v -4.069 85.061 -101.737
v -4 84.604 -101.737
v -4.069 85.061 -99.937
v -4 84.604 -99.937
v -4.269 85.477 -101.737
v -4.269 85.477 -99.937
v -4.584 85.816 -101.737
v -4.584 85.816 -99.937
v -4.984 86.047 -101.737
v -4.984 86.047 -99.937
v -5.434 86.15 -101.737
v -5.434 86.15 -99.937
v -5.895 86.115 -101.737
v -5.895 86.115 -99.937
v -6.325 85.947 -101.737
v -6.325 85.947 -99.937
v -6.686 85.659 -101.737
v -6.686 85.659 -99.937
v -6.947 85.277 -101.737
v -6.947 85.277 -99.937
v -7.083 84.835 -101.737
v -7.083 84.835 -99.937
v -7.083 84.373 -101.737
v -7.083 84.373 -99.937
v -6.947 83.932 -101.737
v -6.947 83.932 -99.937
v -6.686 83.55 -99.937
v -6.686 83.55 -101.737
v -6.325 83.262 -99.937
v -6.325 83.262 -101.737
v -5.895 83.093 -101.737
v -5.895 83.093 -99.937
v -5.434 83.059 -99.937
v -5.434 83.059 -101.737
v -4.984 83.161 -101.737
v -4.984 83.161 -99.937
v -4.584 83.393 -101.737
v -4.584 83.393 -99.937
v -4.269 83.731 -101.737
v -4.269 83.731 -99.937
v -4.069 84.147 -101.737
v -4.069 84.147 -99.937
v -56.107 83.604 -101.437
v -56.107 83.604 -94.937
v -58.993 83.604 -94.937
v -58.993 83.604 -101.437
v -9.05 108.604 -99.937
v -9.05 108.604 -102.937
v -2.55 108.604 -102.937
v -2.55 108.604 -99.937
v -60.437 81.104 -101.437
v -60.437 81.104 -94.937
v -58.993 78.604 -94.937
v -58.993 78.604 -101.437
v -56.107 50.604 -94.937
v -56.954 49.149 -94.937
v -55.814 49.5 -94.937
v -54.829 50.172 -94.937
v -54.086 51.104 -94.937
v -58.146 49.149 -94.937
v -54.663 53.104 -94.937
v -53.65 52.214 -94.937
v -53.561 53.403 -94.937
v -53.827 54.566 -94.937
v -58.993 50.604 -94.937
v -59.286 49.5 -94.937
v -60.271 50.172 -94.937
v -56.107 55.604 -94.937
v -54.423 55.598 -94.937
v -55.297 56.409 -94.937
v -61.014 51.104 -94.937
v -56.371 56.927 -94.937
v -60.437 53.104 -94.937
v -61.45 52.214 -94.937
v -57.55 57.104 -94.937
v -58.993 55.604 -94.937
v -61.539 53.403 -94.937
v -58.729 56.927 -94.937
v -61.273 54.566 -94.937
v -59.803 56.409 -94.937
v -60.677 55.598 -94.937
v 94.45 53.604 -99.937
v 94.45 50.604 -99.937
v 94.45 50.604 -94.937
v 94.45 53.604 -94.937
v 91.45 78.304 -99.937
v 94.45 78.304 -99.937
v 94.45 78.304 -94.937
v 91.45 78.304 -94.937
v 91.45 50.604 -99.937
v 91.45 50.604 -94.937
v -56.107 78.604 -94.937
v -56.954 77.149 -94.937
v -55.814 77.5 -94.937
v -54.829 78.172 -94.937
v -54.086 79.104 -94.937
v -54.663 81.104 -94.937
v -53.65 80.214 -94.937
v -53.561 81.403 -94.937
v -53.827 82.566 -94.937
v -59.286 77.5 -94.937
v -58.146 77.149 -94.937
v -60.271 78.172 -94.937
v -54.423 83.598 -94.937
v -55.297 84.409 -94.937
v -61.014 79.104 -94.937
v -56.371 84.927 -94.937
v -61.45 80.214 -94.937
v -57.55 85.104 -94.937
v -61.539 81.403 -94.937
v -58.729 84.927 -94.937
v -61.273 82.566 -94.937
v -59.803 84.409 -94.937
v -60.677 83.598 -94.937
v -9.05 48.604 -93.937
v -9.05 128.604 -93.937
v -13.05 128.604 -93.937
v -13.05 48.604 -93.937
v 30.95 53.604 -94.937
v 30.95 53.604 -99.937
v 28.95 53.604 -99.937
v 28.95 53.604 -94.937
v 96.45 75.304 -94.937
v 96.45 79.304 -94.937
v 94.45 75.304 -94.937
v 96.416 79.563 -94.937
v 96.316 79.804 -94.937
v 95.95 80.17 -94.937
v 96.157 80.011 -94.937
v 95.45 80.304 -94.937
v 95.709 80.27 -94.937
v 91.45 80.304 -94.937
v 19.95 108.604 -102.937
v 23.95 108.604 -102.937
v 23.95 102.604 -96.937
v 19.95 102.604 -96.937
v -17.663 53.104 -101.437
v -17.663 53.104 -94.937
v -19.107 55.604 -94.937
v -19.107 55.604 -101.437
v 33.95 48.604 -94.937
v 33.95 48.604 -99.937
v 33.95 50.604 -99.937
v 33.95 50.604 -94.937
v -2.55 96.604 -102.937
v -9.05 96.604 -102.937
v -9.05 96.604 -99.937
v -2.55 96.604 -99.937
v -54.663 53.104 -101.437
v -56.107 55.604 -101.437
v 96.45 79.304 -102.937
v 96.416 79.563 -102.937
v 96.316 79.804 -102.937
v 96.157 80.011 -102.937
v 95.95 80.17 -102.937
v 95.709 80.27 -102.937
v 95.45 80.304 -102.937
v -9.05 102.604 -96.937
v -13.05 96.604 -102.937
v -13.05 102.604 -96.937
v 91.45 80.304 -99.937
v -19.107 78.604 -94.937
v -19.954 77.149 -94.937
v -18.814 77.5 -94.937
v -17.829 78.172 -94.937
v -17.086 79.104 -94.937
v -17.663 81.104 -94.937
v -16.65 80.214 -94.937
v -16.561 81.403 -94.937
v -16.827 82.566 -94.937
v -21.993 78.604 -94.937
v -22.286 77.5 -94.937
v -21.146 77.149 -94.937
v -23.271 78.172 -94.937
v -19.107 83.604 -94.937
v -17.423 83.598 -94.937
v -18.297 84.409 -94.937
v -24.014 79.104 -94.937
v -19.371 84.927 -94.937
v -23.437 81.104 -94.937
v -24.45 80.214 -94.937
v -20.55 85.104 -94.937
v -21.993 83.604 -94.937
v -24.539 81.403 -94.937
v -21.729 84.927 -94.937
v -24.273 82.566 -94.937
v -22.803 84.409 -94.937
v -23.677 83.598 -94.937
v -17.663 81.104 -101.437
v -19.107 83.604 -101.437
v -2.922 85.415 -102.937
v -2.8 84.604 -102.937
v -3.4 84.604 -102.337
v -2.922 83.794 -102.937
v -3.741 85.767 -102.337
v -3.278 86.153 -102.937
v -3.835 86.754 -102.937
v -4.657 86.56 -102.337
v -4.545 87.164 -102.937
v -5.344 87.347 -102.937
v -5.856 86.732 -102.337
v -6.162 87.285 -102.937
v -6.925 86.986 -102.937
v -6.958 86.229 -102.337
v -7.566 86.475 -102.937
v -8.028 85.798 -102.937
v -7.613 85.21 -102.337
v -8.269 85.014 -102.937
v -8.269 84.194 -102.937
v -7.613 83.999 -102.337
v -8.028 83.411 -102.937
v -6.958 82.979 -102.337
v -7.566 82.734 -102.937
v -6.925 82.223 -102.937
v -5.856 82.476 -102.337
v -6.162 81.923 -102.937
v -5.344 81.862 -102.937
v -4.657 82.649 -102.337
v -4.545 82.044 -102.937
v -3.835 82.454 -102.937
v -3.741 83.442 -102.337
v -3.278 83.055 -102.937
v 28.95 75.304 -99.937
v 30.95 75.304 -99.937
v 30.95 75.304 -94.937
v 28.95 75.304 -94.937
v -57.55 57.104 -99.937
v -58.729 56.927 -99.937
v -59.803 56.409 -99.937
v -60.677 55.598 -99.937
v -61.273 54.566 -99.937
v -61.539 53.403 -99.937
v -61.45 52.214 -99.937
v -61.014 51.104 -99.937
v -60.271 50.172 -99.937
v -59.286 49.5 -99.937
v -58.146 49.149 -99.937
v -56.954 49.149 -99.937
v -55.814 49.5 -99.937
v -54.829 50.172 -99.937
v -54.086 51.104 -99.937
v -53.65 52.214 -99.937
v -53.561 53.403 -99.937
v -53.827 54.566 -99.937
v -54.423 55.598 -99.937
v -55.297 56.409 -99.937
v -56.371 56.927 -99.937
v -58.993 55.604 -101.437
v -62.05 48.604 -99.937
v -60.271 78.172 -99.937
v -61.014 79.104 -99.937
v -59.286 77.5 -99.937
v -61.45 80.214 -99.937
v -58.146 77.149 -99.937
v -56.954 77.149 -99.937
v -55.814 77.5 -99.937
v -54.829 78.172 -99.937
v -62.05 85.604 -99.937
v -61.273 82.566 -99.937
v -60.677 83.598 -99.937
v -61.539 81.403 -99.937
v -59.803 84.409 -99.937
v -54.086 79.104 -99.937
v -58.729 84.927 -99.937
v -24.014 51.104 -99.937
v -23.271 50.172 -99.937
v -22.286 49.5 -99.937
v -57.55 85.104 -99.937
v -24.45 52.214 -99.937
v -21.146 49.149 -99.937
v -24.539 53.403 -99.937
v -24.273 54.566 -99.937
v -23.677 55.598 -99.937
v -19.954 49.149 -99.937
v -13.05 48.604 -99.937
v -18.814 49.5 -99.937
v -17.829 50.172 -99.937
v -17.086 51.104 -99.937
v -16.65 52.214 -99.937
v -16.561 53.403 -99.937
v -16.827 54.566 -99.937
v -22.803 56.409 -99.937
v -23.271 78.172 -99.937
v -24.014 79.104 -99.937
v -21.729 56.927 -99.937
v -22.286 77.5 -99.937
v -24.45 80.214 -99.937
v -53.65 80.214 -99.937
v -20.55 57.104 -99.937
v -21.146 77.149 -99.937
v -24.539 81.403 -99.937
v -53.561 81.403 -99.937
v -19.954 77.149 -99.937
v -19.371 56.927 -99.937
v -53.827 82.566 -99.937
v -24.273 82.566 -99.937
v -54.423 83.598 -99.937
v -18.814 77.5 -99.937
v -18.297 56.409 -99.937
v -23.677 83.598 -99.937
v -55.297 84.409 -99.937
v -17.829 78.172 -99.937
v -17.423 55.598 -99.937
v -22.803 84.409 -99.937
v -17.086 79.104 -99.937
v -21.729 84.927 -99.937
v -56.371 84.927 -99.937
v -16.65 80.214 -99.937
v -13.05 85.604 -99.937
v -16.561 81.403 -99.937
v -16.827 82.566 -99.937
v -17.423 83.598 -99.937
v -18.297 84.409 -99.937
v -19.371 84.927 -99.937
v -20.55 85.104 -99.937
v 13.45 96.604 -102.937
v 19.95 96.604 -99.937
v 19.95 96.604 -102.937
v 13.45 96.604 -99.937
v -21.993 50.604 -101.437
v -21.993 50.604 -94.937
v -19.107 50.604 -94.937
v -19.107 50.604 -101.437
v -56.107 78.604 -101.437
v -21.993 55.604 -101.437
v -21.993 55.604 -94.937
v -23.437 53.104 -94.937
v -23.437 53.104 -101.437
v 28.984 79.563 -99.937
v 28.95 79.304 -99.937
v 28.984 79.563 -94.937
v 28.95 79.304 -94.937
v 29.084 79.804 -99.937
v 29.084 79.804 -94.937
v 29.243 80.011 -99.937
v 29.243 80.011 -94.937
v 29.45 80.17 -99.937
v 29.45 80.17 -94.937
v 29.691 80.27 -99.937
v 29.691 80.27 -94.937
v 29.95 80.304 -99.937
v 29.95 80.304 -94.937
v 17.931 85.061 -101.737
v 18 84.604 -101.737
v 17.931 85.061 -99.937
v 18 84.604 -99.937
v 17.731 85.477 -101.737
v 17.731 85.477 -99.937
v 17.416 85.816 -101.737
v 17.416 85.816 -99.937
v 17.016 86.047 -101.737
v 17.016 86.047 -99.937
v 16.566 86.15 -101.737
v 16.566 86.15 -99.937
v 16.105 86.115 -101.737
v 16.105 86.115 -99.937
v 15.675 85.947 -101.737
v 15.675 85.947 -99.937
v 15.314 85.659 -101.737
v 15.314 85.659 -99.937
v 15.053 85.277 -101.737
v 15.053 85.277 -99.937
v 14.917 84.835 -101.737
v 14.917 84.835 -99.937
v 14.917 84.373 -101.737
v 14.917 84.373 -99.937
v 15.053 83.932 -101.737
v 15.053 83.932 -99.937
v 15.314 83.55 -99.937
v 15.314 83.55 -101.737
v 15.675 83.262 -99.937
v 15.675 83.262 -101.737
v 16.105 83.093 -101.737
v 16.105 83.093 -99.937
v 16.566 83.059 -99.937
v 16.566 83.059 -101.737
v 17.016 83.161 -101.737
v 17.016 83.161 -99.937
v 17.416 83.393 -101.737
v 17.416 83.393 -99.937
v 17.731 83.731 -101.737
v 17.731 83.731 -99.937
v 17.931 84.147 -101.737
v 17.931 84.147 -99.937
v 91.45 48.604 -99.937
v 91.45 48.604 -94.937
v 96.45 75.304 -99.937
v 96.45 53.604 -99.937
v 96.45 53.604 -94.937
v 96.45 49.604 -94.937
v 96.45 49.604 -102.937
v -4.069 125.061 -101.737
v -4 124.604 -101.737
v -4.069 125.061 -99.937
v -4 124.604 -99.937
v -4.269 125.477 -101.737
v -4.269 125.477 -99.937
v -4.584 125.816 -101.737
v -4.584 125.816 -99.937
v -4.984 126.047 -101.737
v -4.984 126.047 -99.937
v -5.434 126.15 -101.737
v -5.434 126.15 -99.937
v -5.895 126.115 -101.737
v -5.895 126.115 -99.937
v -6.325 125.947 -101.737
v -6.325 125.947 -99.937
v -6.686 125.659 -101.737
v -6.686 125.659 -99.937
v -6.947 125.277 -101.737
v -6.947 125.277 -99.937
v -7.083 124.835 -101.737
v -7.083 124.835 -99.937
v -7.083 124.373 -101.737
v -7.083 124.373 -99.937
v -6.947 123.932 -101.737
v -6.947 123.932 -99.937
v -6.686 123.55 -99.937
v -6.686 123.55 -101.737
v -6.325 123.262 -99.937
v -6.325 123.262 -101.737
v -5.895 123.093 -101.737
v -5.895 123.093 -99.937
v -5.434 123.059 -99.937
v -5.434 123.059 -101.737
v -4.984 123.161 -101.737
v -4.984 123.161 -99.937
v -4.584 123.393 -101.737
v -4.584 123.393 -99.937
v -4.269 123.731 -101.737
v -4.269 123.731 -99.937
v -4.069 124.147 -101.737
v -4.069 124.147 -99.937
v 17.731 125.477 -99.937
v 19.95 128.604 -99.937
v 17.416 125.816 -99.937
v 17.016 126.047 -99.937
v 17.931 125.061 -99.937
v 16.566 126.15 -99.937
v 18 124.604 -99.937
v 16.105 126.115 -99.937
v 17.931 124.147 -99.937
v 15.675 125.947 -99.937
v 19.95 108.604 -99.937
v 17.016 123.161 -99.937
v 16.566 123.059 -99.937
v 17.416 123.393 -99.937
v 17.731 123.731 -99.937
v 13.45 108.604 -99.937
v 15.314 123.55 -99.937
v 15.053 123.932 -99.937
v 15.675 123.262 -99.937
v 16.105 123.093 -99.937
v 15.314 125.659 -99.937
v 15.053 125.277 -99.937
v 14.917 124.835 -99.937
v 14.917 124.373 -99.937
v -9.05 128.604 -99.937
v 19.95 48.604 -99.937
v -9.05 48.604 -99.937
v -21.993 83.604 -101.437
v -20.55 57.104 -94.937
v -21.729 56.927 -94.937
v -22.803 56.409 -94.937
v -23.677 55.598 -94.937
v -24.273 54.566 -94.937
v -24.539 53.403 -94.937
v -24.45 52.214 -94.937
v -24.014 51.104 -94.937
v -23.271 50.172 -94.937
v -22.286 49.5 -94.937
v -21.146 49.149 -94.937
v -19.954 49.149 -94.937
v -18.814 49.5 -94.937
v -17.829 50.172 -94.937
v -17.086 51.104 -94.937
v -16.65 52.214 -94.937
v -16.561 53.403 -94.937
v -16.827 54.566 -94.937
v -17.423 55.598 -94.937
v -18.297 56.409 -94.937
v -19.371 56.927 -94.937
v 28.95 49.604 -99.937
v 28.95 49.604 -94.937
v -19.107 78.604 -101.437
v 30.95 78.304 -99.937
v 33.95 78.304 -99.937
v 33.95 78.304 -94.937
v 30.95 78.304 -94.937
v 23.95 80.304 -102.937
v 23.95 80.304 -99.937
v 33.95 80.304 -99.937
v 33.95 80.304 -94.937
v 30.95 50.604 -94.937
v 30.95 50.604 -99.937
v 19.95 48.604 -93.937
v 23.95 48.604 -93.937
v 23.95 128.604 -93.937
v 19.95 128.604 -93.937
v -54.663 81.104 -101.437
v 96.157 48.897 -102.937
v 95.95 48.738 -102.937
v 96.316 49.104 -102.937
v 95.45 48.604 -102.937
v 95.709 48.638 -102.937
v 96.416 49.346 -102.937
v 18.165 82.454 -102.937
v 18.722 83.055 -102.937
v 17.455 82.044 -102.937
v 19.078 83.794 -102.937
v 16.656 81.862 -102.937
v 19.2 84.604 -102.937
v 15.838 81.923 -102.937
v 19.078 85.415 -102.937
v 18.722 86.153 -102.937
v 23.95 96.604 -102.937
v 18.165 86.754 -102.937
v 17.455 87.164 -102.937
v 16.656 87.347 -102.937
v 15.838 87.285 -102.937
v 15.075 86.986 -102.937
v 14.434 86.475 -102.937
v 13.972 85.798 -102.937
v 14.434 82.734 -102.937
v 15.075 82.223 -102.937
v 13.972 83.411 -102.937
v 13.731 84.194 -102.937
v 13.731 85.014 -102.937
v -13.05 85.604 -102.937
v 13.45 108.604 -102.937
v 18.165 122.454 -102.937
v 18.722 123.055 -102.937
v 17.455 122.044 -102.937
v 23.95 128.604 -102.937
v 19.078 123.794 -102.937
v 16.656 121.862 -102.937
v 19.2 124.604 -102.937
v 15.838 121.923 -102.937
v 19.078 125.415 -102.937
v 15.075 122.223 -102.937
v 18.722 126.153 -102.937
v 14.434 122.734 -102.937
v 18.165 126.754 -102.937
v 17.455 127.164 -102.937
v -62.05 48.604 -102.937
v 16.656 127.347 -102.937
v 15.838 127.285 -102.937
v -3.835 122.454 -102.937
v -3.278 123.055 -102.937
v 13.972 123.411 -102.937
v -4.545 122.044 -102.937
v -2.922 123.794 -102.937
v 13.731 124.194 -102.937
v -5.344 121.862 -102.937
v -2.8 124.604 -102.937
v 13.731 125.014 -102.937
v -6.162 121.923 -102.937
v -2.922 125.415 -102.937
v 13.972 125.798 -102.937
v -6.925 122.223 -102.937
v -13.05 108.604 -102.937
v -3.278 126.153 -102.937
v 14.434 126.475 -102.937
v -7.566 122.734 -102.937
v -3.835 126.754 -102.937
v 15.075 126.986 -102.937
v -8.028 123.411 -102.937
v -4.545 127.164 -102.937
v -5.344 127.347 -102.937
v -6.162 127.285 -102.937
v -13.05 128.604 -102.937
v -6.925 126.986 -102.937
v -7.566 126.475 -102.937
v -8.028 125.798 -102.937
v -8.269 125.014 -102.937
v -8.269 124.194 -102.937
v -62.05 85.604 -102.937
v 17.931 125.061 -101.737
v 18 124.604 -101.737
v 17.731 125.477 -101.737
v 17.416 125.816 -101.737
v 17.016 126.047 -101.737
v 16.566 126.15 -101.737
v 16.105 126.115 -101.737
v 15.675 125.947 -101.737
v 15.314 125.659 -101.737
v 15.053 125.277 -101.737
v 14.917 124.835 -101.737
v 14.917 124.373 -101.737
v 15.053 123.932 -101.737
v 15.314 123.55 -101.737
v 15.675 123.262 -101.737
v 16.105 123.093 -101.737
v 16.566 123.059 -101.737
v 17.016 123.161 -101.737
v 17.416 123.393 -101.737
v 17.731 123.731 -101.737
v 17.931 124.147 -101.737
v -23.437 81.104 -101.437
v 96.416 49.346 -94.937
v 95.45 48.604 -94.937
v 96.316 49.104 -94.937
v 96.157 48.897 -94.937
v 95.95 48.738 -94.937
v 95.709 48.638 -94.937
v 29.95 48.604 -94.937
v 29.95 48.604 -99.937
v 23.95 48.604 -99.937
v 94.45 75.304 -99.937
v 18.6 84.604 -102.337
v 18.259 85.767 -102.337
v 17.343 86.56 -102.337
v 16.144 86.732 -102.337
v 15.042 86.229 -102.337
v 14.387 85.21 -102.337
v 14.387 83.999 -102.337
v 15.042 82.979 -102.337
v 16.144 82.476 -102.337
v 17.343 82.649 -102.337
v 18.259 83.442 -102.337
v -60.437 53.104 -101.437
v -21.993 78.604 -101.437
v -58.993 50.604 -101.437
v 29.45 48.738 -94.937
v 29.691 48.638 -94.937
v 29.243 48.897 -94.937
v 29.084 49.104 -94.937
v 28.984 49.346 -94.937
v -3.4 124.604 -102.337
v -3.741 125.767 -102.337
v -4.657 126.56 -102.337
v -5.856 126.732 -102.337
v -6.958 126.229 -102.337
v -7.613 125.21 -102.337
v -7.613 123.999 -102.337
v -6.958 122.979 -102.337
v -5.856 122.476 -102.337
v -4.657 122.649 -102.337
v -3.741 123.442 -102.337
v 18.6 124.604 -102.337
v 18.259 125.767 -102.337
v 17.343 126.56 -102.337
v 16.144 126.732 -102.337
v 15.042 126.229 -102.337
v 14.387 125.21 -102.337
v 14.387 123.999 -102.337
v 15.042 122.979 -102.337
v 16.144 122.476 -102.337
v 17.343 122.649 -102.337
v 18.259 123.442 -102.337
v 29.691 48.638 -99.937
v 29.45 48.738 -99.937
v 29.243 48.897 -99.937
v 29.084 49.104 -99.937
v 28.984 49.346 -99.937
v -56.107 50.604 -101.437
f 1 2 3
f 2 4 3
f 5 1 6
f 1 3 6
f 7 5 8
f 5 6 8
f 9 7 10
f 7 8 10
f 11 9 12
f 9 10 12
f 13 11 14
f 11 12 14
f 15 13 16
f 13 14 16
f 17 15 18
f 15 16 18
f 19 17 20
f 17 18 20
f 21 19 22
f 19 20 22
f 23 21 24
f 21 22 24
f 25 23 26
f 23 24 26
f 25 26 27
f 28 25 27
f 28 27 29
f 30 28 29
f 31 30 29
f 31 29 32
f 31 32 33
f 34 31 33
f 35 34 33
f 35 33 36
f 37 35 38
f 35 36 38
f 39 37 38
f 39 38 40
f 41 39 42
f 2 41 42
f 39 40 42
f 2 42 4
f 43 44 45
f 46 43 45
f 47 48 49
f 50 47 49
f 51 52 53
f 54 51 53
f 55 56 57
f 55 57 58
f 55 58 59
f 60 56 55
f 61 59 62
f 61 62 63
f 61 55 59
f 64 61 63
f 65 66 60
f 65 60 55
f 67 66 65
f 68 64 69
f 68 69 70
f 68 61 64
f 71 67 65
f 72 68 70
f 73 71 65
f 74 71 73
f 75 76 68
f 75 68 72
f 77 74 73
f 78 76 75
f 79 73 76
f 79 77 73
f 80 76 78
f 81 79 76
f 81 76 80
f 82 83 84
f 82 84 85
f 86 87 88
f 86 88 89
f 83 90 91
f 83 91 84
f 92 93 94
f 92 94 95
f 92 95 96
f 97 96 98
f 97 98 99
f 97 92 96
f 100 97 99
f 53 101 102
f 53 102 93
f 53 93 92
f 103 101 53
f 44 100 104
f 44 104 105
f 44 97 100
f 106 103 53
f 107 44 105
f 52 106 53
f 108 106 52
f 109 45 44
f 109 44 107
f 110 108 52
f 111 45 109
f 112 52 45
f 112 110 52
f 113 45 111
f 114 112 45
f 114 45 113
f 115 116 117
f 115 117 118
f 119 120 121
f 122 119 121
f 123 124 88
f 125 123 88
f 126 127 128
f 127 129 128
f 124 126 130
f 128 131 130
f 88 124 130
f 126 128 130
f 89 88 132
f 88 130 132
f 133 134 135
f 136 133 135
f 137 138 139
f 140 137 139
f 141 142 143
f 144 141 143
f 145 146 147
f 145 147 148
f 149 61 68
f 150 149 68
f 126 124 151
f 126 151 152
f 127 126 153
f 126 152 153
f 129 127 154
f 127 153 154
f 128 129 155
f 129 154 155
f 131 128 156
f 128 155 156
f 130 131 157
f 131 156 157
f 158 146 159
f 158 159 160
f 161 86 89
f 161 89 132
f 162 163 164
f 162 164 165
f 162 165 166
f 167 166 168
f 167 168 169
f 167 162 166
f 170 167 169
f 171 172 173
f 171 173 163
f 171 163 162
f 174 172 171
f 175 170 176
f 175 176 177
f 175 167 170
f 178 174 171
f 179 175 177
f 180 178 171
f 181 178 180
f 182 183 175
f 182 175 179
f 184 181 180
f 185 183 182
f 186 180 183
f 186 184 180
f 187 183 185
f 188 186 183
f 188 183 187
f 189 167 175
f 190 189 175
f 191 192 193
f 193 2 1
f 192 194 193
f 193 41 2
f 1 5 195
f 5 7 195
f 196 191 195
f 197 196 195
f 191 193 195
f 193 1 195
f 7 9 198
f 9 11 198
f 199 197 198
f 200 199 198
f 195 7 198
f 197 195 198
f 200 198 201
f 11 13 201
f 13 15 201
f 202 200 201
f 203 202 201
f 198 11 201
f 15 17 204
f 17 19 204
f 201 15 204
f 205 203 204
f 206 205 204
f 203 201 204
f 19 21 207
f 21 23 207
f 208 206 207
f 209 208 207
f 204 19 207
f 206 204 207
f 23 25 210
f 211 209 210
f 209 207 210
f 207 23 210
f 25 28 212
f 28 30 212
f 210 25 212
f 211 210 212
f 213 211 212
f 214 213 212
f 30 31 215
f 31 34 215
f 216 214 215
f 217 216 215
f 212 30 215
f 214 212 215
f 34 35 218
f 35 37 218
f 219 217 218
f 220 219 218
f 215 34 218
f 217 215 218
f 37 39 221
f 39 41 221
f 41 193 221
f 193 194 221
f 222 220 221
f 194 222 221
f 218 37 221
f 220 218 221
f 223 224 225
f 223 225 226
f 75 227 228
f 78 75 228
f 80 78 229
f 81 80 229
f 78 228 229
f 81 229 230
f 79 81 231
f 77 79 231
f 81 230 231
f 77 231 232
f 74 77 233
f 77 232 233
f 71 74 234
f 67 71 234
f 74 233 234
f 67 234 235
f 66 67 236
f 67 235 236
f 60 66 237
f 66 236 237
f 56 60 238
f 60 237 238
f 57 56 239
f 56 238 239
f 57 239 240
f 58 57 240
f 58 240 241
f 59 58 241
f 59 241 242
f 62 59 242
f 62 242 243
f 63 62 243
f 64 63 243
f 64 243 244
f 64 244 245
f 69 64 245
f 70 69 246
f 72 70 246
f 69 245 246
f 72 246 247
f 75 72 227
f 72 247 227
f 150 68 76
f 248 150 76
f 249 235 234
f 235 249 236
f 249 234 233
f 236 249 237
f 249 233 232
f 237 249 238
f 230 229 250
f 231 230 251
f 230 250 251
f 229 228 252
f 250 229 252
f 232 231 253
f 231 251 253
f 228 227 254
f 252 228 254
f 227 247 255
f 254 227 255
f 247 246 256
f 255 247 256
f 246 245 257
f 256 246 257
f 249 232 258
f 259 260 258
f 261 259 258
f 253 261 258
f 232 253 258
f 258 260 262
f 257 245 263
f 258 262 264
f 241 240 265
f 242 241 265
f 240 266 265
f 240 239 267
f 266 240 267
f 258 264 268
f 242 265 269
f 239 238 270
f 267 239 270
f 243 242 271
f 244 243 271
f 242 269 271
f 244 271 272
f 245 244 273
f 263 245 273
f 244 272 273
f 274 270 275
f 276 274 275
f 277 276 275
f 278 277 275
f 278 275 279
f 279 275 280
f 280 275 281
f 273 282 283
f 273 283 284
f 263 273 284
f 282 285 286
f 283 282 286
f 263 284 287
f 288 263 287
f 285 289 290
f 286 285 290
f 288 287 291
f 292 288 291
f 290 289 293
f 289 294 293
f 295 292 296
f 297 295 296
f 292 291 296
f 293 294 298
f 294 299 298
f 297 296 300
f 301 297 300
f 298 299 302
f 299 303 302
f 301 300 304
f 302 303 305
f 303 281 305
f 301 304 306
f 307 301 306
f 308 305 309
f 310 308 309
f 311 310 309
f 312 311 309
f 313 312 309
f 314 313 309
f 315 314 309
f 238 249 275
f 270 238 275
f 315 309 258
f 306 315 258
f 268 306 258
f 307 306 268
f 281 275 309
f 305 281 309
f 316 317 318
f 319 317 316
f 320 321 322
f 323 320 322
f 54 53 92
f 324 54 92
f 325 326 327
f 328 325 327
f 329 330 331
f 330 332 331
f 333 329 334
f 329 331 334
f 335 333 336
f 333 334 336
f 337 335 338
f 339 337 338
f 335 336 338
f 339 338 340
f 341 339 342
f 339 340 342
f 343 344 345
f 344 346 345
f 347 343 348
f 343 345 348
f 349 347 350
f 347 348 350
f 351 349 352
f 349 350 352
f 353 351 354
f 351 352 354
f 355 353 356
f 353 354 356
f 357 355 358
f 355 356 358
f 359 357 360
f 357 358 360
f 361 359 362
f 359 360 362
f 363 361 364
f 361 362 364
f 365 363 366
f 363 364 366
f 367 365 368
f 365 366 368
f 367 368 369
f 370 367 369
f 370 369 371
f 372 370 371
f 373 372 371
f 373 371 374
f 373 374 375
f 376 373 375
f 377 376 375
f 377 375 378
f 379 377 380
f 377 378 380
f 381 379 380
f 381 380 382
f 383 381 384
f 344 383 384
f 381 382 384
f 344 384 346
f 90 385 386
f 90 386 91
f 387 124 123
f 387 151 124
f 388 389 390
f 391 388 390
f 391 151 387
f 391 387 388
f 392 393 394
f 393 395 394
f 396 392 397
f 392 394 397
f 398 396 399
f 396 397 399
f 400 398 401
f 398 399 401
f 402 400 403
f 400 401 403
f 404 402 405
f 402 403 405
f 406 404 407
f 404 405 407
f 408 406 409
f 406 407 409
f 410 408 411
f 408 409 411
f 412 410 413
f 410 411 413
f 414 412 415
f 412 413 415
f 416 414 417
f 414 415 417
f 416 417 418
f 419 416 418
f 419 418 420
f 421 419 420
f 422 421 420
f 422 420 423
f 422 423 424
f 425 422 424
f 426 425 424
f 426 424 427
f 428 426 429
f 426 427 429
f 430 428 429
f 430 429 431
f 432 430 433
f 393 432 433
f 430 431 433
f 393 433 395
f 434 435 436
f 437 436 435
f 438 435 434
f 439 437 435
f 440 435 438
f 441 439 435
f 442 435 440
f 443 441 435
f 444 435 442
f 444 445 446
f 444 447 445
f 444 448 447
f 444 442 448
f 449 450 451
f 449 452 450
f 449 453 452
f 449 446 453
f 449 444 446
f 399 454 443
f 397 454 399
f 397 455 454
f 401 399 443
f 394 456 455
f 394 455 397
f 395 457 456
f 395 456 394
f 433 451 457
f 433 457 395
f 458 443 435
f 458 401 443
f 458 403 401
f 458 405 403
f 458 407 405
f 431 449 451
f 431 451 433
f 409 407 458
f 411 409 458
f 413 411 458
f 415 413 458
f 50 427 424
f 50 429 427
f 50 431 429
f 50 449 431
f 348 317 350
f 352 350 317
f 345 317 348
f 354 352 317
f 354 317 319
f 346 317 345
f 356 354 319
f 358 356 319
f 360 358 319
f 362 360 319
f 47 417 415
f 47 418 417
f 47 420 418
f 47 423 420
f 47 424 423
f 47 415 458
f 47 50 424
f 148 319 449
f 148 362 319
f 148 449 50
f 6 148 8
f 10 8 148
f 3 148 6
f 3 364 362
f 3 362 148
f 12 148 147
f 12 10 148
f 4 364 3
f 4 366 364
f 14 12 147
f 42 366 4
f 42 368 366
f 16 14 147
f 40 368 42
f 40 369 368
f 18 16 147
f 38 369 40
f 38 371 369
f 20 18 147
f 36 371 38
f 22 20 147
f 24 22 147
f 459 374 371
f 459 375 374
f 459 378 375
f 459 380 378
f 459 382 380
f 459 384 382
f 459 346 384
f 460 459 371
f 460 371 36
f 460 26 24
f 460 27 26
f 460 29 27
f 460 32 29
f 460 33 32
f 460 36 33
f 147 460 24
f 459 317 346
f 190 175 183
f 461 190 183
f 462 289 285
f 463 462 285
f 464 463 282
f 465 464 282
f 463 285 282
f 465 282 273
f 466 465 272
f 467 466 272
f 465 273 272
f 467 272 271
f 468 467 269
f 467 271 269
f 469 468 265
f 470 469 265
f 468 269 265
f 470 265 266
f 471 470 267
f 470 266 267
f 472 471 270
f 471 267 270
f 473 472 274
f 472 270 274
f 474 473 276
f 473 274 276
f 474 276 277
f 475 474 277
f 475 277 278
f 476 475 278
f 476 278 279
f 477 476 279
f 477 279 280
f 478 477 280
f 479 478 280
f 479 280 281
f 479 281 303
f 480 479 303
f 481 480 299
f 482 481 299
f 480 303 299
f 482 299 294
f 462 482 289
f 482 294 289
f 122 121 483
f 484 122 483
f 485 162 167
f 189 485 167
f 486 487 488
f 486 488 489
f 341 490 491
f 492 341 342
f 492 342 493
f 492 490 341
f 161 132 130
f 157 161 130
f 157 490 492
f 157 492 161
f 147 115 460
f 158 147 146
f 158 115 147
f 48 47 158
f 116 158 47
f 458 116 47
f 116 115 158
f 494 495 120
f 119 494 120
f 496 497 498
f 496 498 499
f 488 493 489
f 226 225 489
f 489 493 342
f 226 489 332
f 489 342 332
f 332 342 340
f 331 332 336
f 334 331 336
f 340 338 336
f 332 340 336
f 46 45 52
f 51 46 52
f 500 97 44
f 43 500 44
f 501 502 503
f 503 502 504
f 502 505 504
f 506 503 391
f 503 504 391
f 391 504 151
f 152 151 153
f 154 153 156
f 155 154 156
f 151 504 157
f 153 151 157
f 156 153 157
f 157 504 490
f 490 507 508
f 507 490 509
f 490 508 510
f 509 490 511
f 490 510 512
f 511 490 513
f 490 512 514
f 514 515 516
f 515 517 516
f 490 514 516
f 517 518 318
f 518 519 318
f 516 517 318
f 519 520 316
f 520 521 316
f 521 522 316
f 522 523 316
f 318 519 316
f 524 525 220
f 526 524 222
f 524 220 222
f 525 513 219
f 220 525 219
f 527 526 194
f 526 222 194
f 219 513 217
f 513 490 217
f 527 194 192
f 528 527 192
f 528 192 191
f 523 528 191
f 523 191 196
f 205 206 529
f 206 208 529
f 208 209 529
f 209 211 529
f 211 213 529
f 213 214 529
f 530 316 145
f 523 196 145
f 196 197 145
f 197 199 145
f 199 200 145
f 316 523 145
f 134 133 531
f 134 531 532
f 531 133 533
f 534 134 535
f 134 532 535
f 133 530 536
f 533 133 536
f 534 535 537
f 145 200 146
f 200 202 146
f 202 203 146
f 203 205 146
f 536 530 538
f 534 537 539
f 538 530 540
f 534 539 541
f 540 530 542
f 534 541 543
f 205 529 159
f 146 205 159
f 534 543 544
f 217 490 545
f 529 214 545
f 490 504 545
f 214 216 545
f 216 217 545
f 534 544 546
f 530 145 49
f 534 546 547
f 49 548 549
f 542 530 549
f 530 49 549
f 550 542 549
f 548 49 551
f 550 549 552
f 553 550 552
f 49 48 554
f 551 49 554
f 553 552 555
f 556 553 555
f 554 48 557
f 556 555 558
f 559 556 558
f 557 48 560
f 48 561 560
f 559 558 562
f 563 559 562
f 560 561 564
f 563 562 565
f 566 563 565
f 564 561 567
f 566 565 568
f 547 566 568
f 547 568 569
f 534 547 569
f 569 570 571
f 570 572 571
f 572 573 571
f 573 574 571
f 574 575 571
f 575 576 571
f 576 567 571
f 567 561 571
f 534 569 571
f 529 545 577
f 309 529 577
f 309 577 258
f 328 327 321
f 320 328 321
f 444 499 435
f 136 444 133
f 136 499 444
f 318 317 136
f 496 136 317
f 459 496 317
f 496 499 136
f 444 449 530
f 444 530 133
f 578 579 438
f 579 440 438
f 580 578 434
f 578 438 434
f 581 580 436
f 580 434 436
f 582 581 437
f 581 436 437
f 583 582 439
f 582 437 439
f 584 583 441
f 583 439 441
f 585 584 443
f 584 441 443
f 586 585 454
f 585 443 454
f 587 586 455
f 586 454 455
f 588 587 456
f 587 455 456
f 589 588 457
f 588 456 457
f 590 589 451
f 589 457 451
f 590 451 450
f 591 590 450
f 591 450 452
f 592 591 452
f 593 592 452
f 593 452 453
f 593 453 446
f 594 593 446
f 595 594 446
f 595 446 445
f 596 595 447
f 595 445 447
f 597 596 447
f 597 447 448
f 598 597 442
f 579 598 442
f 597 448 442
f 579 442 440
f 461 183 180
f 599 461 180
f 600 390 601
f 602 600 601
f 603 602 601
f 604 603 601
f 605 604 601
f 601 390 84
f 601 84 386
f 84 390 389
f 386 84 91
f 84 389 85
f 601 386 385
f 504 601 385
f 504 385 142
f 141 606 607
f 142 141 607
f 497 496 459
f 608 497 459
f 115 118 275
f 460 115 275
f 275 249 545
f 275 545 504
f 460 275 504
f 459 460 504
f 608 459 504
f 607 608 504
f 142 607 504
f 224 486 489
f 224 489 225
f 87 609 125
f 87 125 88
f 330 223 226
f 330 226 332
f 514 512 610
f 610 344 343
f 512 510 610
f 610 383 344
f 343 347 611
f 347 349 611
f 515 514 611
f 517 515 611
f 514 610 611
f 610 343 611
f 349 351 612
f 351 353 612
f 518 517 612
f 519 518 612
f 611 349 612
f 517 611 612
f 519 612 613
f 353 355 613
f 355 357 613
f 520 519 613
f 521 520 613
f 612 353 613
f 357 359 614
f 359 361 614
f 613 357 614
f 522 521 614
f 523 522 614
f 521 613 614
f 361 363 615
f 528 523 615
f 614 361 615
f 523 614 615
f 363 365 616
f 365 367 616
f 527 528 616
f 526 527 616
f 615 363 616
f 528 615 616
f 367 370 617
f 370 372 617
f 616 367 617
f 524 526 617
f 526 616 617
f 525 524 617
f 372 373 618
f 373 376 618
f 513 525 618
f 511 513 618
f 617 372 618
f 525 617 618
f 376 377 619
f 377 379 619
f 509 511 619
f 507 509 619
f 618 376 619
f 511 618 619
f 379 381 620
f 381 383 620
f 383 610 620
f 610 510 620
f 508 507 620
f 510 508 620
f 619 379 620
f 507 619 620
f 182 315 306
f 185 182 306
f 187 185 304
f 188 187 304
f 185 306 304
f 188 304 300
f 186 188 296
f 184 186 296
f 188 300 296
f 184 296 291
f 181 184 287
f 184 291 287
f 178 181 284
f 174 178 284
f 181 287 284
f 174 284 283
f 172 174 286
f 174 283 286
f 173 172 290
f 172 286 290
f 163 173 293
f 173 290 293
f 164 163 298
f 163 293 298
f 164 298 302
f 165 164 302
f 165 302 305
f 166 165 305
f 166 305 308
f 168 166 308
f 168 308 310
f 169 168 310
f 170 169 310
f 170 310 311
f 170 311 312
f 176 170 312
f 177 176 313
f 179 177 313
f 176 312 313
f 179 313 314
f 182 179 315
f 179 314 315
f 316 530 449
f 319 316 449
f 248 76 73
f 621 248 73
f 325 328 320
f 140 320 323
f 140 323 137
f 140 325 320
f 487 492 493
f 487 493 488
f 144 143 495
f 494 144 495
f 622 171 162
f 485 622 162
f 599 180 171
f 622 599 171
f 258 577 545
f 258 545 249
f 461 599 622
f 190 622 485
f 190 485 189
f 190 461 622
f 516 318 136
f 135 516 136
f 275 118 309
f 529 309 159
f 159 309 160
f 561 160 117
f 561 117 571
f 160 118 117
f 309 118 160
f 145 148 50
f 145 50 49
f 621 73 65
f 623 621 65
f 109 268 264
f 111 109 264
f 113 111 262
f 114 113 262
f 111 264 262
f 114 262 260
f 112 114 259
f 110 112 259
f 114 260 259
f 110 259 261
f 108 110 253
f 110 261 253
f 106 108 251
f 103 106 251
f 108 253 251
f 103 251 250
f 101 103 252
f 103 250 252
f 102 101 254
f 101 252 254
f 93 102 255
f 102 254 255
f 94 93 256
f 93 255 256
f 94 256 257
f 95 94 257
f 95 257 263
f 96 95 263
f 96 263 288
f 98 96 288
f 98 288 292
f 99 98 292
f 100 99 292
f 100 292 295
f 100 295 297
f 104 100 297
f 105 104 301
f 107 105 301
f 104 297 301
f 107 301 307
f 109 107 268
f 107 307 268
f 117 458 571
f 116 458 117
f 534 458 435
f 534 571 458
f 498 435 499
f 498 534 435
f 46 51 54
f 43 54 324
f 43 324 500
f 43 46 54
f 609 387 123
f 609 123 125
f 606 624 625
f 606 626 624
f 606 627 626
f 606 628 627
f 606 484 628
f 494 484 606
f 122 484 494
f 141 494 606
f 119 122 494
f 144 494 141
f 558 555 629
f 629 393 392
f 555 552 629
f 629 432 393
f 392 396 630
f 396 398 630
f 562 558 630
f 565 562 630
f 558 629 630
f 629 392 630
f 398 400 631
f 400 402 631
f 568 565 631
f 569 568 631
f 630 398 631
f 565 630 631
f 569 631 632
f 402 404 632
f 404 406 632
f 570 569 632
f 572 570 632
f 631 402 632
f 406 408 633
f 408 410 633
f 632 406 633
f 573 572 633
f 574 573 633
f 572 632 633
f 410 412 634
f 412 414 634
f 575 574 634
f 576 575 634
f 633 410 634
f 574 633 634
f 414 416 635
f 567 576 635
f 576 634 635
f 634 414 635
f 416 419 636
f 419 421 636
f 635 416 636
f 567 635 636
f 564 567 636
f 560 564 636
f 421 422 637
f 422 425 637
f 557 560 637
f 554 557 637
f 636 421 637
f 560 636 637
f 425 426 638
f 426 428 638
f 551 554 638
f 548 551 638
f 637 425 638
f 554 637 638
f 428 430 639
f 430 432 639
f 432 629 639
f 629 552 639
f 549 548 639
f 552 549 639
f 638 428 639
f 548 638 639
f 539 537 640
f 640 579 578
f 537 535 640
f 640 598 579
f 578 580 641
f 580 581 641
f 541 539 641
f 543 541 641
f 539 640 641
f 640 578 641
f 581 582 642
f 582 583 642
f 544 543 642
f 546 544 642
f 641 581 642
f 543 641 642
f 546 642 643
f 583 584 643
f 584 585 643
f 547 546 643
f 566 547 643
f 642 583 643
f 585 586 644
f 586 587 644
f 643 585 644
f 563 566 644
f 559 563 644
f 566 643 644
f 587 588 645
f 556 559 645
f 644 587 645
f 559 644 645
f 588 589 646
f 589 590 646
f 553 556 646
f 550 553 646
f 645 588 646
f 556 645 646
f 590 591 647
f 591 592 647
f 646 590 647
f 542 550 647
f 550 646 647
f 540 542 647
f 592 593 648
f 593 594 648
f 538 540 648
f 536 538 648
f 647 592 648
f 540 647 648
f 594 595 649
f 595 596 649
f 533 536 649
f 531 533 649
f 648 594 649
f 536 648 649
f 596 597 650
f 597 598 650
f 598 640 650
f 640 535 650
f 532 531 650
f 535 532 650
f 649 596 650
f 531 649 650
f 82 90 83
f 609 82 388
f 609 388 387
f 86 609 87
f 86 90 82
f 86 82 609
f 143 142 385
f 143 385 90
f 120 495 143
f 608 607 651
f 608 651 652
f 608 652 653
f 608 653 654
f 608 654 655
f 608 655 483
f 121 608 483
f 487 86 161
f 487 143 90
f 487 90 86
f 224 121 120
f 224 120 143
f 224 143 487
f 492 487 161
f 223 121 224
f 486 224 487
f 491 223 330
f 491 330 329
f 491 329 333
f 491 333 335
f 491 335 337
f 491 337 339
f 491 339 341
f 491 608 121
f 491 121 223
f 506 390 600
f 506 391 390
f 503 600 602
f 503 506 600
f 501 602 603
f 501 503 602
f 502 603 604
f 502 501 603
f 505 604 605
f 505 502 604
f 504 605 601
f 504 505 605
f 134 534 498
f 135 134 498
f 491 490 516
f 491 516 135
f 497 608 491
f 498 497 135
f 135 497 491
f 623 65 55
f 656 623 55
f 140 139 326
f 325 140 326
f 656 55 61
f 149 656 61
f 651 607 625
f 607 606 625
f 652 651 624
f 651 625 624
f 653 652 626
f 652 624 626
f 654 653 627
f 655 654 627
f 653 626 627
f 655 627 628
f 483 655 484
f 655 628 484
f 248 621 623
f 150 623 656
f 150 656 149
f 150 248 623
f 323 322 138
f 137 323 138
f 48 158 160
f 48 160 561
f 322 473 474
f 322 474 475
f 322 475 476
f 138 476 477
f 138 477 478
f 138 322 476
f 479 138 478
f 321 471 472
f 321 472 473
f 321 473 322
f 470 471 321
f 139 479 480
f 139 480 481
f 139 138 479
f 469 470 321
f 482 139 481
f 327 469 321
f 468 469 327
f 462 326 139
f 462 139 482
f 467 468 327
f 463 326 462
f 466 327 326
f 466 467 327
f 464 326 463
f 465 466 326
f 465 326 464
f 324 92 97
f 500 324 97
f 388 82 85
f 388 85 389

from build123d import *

# Parameters (mm, degrees)
BOSS_EXTRUDE1_START                               = 19.95
BOSS_EXTRUDE1_DEPTH                               = 4
SKETCH2_W                                         = 33
SKETCH2_H                                         = 60
BOSS_EXTRUDE2_DEPTH                               = 3
CUT_EXTRUDE1_DEPTH                                = 4
SKETCH4_W                                         = 29
SKETCH4_H                                         = 3
CUT_EXTRUDE2_DEPTH                                = 12
SKETCH5_W                                         = 22.5
SKETCH5_H                                         = 3
BOSS_EXTRUDE3_DEPTH                               = 12
BOSS_EXTRUDE4_DEPTH                               = 20
SKETCH7_W                                         = 6.5
SKETCH7_H                                         = 3
CUT_EXTRUDE3_DEPTH                                = 12
BOSS_EXTRUDE5_DEPTH                               = 4
SKETCH9_W                                         = 3
SKETCH9_H                                         = 37
BOSS_EXTRUDE6_DEPTH                               = 49
SKETCH10_W                                        = 3
SKETCH10_H                                        = 31.7
BOSS_EXTRUDE7_DEPTH                               = 72.5
CSK_FOR_M2_5_FLAT_HEAD_MACHINE_SCREW1_D           = 3.1
CSK_FOR_M2_5_FLAT_HEAD_MACHINE_SCREW1_CSINK_D     = 5.5
CSK_FOR_M2_5_FLAT_HEAD_MACHINE_SCREW1_CSINK_ANGLE = 90
BOSS_EXTRUDE8_DEPTH                               = 5
FILLET1_R                                         = 1
SKETCH26_R                                        = 4
BOSS_EXTRUDE10_DEPTH                              = 5
CUT_EXTRUDE4_DEPTH                                = 6.5


with BuildPart() as part:
    # Boss-Extrude1: read off the stored shape, not the designer's step
    # Boss-Extrude1 outline → Boss-Extrude1 (new body)
    with BuildSketch(Plane.YZ.offset(BOSS_EXTRUDE1_START)):
        Polygon((108.604346835, -99.936709039), (108.604346835, -93.936709039), (48.604346835, -93.936709039), (48.604346835, -99.936709039), (99.604346835, -99.936709039), (102.604346835, -96.936709039), (105.604346835, -99.936709039), align=None)
    extrude(amount=BOSS_EXTRUDE1_DEPTH)

    # Sketch2 → Boss-Extrude2 (add)
    with BuildSketch(Plane(origin=(0, 0, -99.936709039), x_dir=(-1, 0, 0), z_dir=(0, 0, -1))):
        with Locations((-7.45, 78.604346835)):
            Rectangle(SKETCH2_W, SKETCH2_H)
    extrude(amount=BOSS_EXTRUDE2_DEPTH)

    # Sketch3 → Cut-Extrude1 (cut)
    with BuildSketch(Plane(origin=(23.95, 0, 0), x_dir=(0, 0, -1), z_dir=(1, 0, 0))):
        Polygon((99.936709039, 99.604346835), (102.936709039, 96.604346835), (102.936709039, 108.604346835), (99.936709039, 105.604346835), align=None)
    extrude(amount=-CUT_EXTRUDE1_DEPTH, mode=Mode.SUBTRACT)

    # Sketch4 → Cut-Extrude2 (cut)
    with BuildSketch(Plane(origin=(0, 108.604346835, 0), x_dir=(-1, 0, 0), z_dir=(0, 1, 0))):
        with Locations((-5.45, -101.436709039)):
            Rectangle(SKETCH4_W, SKETCH4_H)
    extrude(amount=-CUT_EXTRUDE2_DEPTH, mode=Mode.SUBTRACT)

    # Sketch5 → Boss-Extrude3 (add)
    with BuildSketch(Plane(origin=(0, 96.604346835, 0), x_dir=(-1, 0, 0), z_dir=(0, 1, 0))):
        with Locations((-2.2, -101.436709039)):
            Rectangle(SKETCH5_W, SKETCH5_H)
    extrude(amount=BOSS_EXTRUDE3_DEPTH)

    # Sketch6 → Boss-Extrude4 (add)
    with BuildSketch(Plane(origin=(0, 108.604346835, 0), x_dir=(-1, 0, 0), z_dir=(0, 1, 0))):
        Polygon((9.05, -99.936709039), (9.05, -102.936709039), (-23.95, -102.936709039), (-23.95, -93.936709039), (-19.95, -93.936709039), (-19.95, -99.936709039), align=None)
    extrude(amount=BOSS_EXTRUDE4_DEPTH)

    # Sketch7 → Cut-Extrude3 (cut)
    with BuildSketch(Plane(origin=(0, 108.604346835, 0), x_dir=(1, 0, 0), z_dir=(0, 1, 0))):
        with Locations((-5.8, 101.436709039)):
            Rectangle(SKETCH7_W, SKETCH7_H)
    extrude(amount=-CUT_EXTRUDE3_DEPTH, mode=Mode.SUBTRACT)

    # Sketch8 → Boss-Extrude5 (add)
    with BuildSketch(Plane.ZY.offset(9.05)):
        Polygon((-102.936709039, 96.604346835), (-96.936709039, 102.604346835), (-102.936709039, 108.604346835), (-102.936709039, 128.604346835), (-93.936709039, 128.604346835), (-93.936709039, 48.604346835), (-102.936709039, 48.604346835), align=None)
    extrude(amount=BOSS_EXTRUDE5_DEPTH)

    # Sketch9 → Boss-Extrude6 (add)
    with BuildSketch(Plane.ZY.offset(13.05)):
        with Locations((-101.436709039, 67.104346835)):
            Rectangle(SKETCH9_W, SKETCH9_H)
    extrude(amount=BOSS_EXTRUDE6_DEPTH)

    # Sketch10 → Boss-Extrude7 (add)
    with BuildSketch(Plane(origin=(23.95, 0, 0), x_dir=(0, 0, -1), z_dir=(1, 0, 0))):
        with Locations((101.436709039, 64.454346835)):
            Rectangle(SKETCH10_W, SKETCH10_H)
    extrude(amount=BOSS_EXTRUDE7_DEPTH)

    # CSK for M2.5 Flat Head Machine Screw1 (through all)
    with Locations(Plane(origin=(0, 0, -102.936709039), x_dir=(-1, 0, 0), z_dir=(0, 0, -1))):
        with Locations((-16.45, 124.604346835), (-16.45, 84.604346835), (5.55, 124.604346835), (5.55, 84.604346835)):
            CounterSinkHole(CSK_FOR_M2_5_FLAT_HEAD_MACHINE_SCREW1_D / 2, CSK_FOR_M2_5_FLAT_HEAD_MACHINE_SCREW1_CSINK_D / 2, counter_sink_angle=CSK_FOR_M2_5_FLAT_HEAD_MACHINE_SCREW1_CSINK_ANGLE)

    # Sketch24 → Boss-Extrude8 (add)
    with BuildSketch(Plane.XY.offset(-99.936709039)):
        Polygon((28.95, 75.304346835), (28.95, 80.304346835), (33.95, 80.304346835), (33.95, 78.304346835), (30.95, 78.304346835), (30.95, 75.304346835), align=None)
        Polygon((91.45, 78.304346835), (91.45, 80.304346835), (96.45, 80.304346835), (96.45, 75.304346835), (94.45, 75.304346835), (94.45, 78.304346835), align=None)
        Polygon((28.95, 53.604346835), (28.95, 48.604346835), (33.95, 48.604346835), (33.95, 50.604346835), (30.95, 50.604346835), (30.95, 53.604346835), align=None)
        Polygon((96.45, 53.604346835), (96.45, 48.604346835), (91.45, 48.604346835), (91.45, 50.604346835), (94.45, 50.604346835), (94.45, 53.604346835), align=None)
    extrude(amount=BOSS_EXTRUDE8_DEPTH)

    # Fillet1
    fillet1_edges = [part.edges().sort_by_distance(p)[0] for p in [
        (96.45, 80.304346835, -98.936709039),
        (96.45, 48.604346835, -98.936709039),
        (28.95, 80.304346835, -97.436709039),
        (28.95, 48.604346835, -97.436709039),
    ]]
    fillet(fillet1_edges, radius=FILLET1_R)

    # Sketch26 → Boss-Extrude10 (add)
    with BuildSketch(Plane.XY.offset(-99.936709039)):
        with Locations(Location((-57.55, 81.104346835, 0), (0, 0, 90))):
            Circle(SKETCH26_R)
        with Locations(Location((-20.55, 81.104346835, 0), (0, 0, 90))):
            Circle(SKETCH26_R)
        with Locations(Location((-20.55, 53.104346835, 0), (0, 0, 90))):
            Circle(SKETCH26_R)
        with Locations(Location((-57.55, 53.104346835, 0), (0, 0, 90))):
            Circle(SKETCH26_R)
    extrude(amount=BOSS_EXTRUDE10_DEPTH)

    # Sketch27 → Cut-Extrude4 (cut)
    with BuildSketch(Plane.XY.offset(-94.936709039)):
        Polygon((-54.663248654, 81.104346835), (-56.106624327, 83.604346835), (-58.993375673, 83.604346835), (-60.436751346, 81.104346835), (-58.993375673, 78.604346835), (-56.106624327, 78.604346835), align=None)
        Polygon((-17.663248654, 81.104346835), (-19.106624327, 83.604346835), (-21.993375673, 83.604346835), (-23.436751346, 81.104346835), (-21.993375673, 78.604346835), (-19.106624327, 78.604346835), align=None)
        Polygon((-17.663248654, 53.104346835), (-19.106624327, 55.604346835), (-21.993375673, 55.604346835), (-23.436751346, 53.104346835), (-21.993375673, 50.604346835), (-19.106624327, 50.604346835), align=None)
        Polygon((-54.663248654, 53.104346835), (-56.106624327, 55.604346835), (-58.993375673, 55.604346835), (-60.436751346, 53.104346835), (-58.993375673, 50.604346835), (-56.106624327, 50.604346835), align=None)
    extrude(amount=-CUT_EXTRUDE4_DEPTH, mode=Mode.SUBTRACT)


solid = part.part
